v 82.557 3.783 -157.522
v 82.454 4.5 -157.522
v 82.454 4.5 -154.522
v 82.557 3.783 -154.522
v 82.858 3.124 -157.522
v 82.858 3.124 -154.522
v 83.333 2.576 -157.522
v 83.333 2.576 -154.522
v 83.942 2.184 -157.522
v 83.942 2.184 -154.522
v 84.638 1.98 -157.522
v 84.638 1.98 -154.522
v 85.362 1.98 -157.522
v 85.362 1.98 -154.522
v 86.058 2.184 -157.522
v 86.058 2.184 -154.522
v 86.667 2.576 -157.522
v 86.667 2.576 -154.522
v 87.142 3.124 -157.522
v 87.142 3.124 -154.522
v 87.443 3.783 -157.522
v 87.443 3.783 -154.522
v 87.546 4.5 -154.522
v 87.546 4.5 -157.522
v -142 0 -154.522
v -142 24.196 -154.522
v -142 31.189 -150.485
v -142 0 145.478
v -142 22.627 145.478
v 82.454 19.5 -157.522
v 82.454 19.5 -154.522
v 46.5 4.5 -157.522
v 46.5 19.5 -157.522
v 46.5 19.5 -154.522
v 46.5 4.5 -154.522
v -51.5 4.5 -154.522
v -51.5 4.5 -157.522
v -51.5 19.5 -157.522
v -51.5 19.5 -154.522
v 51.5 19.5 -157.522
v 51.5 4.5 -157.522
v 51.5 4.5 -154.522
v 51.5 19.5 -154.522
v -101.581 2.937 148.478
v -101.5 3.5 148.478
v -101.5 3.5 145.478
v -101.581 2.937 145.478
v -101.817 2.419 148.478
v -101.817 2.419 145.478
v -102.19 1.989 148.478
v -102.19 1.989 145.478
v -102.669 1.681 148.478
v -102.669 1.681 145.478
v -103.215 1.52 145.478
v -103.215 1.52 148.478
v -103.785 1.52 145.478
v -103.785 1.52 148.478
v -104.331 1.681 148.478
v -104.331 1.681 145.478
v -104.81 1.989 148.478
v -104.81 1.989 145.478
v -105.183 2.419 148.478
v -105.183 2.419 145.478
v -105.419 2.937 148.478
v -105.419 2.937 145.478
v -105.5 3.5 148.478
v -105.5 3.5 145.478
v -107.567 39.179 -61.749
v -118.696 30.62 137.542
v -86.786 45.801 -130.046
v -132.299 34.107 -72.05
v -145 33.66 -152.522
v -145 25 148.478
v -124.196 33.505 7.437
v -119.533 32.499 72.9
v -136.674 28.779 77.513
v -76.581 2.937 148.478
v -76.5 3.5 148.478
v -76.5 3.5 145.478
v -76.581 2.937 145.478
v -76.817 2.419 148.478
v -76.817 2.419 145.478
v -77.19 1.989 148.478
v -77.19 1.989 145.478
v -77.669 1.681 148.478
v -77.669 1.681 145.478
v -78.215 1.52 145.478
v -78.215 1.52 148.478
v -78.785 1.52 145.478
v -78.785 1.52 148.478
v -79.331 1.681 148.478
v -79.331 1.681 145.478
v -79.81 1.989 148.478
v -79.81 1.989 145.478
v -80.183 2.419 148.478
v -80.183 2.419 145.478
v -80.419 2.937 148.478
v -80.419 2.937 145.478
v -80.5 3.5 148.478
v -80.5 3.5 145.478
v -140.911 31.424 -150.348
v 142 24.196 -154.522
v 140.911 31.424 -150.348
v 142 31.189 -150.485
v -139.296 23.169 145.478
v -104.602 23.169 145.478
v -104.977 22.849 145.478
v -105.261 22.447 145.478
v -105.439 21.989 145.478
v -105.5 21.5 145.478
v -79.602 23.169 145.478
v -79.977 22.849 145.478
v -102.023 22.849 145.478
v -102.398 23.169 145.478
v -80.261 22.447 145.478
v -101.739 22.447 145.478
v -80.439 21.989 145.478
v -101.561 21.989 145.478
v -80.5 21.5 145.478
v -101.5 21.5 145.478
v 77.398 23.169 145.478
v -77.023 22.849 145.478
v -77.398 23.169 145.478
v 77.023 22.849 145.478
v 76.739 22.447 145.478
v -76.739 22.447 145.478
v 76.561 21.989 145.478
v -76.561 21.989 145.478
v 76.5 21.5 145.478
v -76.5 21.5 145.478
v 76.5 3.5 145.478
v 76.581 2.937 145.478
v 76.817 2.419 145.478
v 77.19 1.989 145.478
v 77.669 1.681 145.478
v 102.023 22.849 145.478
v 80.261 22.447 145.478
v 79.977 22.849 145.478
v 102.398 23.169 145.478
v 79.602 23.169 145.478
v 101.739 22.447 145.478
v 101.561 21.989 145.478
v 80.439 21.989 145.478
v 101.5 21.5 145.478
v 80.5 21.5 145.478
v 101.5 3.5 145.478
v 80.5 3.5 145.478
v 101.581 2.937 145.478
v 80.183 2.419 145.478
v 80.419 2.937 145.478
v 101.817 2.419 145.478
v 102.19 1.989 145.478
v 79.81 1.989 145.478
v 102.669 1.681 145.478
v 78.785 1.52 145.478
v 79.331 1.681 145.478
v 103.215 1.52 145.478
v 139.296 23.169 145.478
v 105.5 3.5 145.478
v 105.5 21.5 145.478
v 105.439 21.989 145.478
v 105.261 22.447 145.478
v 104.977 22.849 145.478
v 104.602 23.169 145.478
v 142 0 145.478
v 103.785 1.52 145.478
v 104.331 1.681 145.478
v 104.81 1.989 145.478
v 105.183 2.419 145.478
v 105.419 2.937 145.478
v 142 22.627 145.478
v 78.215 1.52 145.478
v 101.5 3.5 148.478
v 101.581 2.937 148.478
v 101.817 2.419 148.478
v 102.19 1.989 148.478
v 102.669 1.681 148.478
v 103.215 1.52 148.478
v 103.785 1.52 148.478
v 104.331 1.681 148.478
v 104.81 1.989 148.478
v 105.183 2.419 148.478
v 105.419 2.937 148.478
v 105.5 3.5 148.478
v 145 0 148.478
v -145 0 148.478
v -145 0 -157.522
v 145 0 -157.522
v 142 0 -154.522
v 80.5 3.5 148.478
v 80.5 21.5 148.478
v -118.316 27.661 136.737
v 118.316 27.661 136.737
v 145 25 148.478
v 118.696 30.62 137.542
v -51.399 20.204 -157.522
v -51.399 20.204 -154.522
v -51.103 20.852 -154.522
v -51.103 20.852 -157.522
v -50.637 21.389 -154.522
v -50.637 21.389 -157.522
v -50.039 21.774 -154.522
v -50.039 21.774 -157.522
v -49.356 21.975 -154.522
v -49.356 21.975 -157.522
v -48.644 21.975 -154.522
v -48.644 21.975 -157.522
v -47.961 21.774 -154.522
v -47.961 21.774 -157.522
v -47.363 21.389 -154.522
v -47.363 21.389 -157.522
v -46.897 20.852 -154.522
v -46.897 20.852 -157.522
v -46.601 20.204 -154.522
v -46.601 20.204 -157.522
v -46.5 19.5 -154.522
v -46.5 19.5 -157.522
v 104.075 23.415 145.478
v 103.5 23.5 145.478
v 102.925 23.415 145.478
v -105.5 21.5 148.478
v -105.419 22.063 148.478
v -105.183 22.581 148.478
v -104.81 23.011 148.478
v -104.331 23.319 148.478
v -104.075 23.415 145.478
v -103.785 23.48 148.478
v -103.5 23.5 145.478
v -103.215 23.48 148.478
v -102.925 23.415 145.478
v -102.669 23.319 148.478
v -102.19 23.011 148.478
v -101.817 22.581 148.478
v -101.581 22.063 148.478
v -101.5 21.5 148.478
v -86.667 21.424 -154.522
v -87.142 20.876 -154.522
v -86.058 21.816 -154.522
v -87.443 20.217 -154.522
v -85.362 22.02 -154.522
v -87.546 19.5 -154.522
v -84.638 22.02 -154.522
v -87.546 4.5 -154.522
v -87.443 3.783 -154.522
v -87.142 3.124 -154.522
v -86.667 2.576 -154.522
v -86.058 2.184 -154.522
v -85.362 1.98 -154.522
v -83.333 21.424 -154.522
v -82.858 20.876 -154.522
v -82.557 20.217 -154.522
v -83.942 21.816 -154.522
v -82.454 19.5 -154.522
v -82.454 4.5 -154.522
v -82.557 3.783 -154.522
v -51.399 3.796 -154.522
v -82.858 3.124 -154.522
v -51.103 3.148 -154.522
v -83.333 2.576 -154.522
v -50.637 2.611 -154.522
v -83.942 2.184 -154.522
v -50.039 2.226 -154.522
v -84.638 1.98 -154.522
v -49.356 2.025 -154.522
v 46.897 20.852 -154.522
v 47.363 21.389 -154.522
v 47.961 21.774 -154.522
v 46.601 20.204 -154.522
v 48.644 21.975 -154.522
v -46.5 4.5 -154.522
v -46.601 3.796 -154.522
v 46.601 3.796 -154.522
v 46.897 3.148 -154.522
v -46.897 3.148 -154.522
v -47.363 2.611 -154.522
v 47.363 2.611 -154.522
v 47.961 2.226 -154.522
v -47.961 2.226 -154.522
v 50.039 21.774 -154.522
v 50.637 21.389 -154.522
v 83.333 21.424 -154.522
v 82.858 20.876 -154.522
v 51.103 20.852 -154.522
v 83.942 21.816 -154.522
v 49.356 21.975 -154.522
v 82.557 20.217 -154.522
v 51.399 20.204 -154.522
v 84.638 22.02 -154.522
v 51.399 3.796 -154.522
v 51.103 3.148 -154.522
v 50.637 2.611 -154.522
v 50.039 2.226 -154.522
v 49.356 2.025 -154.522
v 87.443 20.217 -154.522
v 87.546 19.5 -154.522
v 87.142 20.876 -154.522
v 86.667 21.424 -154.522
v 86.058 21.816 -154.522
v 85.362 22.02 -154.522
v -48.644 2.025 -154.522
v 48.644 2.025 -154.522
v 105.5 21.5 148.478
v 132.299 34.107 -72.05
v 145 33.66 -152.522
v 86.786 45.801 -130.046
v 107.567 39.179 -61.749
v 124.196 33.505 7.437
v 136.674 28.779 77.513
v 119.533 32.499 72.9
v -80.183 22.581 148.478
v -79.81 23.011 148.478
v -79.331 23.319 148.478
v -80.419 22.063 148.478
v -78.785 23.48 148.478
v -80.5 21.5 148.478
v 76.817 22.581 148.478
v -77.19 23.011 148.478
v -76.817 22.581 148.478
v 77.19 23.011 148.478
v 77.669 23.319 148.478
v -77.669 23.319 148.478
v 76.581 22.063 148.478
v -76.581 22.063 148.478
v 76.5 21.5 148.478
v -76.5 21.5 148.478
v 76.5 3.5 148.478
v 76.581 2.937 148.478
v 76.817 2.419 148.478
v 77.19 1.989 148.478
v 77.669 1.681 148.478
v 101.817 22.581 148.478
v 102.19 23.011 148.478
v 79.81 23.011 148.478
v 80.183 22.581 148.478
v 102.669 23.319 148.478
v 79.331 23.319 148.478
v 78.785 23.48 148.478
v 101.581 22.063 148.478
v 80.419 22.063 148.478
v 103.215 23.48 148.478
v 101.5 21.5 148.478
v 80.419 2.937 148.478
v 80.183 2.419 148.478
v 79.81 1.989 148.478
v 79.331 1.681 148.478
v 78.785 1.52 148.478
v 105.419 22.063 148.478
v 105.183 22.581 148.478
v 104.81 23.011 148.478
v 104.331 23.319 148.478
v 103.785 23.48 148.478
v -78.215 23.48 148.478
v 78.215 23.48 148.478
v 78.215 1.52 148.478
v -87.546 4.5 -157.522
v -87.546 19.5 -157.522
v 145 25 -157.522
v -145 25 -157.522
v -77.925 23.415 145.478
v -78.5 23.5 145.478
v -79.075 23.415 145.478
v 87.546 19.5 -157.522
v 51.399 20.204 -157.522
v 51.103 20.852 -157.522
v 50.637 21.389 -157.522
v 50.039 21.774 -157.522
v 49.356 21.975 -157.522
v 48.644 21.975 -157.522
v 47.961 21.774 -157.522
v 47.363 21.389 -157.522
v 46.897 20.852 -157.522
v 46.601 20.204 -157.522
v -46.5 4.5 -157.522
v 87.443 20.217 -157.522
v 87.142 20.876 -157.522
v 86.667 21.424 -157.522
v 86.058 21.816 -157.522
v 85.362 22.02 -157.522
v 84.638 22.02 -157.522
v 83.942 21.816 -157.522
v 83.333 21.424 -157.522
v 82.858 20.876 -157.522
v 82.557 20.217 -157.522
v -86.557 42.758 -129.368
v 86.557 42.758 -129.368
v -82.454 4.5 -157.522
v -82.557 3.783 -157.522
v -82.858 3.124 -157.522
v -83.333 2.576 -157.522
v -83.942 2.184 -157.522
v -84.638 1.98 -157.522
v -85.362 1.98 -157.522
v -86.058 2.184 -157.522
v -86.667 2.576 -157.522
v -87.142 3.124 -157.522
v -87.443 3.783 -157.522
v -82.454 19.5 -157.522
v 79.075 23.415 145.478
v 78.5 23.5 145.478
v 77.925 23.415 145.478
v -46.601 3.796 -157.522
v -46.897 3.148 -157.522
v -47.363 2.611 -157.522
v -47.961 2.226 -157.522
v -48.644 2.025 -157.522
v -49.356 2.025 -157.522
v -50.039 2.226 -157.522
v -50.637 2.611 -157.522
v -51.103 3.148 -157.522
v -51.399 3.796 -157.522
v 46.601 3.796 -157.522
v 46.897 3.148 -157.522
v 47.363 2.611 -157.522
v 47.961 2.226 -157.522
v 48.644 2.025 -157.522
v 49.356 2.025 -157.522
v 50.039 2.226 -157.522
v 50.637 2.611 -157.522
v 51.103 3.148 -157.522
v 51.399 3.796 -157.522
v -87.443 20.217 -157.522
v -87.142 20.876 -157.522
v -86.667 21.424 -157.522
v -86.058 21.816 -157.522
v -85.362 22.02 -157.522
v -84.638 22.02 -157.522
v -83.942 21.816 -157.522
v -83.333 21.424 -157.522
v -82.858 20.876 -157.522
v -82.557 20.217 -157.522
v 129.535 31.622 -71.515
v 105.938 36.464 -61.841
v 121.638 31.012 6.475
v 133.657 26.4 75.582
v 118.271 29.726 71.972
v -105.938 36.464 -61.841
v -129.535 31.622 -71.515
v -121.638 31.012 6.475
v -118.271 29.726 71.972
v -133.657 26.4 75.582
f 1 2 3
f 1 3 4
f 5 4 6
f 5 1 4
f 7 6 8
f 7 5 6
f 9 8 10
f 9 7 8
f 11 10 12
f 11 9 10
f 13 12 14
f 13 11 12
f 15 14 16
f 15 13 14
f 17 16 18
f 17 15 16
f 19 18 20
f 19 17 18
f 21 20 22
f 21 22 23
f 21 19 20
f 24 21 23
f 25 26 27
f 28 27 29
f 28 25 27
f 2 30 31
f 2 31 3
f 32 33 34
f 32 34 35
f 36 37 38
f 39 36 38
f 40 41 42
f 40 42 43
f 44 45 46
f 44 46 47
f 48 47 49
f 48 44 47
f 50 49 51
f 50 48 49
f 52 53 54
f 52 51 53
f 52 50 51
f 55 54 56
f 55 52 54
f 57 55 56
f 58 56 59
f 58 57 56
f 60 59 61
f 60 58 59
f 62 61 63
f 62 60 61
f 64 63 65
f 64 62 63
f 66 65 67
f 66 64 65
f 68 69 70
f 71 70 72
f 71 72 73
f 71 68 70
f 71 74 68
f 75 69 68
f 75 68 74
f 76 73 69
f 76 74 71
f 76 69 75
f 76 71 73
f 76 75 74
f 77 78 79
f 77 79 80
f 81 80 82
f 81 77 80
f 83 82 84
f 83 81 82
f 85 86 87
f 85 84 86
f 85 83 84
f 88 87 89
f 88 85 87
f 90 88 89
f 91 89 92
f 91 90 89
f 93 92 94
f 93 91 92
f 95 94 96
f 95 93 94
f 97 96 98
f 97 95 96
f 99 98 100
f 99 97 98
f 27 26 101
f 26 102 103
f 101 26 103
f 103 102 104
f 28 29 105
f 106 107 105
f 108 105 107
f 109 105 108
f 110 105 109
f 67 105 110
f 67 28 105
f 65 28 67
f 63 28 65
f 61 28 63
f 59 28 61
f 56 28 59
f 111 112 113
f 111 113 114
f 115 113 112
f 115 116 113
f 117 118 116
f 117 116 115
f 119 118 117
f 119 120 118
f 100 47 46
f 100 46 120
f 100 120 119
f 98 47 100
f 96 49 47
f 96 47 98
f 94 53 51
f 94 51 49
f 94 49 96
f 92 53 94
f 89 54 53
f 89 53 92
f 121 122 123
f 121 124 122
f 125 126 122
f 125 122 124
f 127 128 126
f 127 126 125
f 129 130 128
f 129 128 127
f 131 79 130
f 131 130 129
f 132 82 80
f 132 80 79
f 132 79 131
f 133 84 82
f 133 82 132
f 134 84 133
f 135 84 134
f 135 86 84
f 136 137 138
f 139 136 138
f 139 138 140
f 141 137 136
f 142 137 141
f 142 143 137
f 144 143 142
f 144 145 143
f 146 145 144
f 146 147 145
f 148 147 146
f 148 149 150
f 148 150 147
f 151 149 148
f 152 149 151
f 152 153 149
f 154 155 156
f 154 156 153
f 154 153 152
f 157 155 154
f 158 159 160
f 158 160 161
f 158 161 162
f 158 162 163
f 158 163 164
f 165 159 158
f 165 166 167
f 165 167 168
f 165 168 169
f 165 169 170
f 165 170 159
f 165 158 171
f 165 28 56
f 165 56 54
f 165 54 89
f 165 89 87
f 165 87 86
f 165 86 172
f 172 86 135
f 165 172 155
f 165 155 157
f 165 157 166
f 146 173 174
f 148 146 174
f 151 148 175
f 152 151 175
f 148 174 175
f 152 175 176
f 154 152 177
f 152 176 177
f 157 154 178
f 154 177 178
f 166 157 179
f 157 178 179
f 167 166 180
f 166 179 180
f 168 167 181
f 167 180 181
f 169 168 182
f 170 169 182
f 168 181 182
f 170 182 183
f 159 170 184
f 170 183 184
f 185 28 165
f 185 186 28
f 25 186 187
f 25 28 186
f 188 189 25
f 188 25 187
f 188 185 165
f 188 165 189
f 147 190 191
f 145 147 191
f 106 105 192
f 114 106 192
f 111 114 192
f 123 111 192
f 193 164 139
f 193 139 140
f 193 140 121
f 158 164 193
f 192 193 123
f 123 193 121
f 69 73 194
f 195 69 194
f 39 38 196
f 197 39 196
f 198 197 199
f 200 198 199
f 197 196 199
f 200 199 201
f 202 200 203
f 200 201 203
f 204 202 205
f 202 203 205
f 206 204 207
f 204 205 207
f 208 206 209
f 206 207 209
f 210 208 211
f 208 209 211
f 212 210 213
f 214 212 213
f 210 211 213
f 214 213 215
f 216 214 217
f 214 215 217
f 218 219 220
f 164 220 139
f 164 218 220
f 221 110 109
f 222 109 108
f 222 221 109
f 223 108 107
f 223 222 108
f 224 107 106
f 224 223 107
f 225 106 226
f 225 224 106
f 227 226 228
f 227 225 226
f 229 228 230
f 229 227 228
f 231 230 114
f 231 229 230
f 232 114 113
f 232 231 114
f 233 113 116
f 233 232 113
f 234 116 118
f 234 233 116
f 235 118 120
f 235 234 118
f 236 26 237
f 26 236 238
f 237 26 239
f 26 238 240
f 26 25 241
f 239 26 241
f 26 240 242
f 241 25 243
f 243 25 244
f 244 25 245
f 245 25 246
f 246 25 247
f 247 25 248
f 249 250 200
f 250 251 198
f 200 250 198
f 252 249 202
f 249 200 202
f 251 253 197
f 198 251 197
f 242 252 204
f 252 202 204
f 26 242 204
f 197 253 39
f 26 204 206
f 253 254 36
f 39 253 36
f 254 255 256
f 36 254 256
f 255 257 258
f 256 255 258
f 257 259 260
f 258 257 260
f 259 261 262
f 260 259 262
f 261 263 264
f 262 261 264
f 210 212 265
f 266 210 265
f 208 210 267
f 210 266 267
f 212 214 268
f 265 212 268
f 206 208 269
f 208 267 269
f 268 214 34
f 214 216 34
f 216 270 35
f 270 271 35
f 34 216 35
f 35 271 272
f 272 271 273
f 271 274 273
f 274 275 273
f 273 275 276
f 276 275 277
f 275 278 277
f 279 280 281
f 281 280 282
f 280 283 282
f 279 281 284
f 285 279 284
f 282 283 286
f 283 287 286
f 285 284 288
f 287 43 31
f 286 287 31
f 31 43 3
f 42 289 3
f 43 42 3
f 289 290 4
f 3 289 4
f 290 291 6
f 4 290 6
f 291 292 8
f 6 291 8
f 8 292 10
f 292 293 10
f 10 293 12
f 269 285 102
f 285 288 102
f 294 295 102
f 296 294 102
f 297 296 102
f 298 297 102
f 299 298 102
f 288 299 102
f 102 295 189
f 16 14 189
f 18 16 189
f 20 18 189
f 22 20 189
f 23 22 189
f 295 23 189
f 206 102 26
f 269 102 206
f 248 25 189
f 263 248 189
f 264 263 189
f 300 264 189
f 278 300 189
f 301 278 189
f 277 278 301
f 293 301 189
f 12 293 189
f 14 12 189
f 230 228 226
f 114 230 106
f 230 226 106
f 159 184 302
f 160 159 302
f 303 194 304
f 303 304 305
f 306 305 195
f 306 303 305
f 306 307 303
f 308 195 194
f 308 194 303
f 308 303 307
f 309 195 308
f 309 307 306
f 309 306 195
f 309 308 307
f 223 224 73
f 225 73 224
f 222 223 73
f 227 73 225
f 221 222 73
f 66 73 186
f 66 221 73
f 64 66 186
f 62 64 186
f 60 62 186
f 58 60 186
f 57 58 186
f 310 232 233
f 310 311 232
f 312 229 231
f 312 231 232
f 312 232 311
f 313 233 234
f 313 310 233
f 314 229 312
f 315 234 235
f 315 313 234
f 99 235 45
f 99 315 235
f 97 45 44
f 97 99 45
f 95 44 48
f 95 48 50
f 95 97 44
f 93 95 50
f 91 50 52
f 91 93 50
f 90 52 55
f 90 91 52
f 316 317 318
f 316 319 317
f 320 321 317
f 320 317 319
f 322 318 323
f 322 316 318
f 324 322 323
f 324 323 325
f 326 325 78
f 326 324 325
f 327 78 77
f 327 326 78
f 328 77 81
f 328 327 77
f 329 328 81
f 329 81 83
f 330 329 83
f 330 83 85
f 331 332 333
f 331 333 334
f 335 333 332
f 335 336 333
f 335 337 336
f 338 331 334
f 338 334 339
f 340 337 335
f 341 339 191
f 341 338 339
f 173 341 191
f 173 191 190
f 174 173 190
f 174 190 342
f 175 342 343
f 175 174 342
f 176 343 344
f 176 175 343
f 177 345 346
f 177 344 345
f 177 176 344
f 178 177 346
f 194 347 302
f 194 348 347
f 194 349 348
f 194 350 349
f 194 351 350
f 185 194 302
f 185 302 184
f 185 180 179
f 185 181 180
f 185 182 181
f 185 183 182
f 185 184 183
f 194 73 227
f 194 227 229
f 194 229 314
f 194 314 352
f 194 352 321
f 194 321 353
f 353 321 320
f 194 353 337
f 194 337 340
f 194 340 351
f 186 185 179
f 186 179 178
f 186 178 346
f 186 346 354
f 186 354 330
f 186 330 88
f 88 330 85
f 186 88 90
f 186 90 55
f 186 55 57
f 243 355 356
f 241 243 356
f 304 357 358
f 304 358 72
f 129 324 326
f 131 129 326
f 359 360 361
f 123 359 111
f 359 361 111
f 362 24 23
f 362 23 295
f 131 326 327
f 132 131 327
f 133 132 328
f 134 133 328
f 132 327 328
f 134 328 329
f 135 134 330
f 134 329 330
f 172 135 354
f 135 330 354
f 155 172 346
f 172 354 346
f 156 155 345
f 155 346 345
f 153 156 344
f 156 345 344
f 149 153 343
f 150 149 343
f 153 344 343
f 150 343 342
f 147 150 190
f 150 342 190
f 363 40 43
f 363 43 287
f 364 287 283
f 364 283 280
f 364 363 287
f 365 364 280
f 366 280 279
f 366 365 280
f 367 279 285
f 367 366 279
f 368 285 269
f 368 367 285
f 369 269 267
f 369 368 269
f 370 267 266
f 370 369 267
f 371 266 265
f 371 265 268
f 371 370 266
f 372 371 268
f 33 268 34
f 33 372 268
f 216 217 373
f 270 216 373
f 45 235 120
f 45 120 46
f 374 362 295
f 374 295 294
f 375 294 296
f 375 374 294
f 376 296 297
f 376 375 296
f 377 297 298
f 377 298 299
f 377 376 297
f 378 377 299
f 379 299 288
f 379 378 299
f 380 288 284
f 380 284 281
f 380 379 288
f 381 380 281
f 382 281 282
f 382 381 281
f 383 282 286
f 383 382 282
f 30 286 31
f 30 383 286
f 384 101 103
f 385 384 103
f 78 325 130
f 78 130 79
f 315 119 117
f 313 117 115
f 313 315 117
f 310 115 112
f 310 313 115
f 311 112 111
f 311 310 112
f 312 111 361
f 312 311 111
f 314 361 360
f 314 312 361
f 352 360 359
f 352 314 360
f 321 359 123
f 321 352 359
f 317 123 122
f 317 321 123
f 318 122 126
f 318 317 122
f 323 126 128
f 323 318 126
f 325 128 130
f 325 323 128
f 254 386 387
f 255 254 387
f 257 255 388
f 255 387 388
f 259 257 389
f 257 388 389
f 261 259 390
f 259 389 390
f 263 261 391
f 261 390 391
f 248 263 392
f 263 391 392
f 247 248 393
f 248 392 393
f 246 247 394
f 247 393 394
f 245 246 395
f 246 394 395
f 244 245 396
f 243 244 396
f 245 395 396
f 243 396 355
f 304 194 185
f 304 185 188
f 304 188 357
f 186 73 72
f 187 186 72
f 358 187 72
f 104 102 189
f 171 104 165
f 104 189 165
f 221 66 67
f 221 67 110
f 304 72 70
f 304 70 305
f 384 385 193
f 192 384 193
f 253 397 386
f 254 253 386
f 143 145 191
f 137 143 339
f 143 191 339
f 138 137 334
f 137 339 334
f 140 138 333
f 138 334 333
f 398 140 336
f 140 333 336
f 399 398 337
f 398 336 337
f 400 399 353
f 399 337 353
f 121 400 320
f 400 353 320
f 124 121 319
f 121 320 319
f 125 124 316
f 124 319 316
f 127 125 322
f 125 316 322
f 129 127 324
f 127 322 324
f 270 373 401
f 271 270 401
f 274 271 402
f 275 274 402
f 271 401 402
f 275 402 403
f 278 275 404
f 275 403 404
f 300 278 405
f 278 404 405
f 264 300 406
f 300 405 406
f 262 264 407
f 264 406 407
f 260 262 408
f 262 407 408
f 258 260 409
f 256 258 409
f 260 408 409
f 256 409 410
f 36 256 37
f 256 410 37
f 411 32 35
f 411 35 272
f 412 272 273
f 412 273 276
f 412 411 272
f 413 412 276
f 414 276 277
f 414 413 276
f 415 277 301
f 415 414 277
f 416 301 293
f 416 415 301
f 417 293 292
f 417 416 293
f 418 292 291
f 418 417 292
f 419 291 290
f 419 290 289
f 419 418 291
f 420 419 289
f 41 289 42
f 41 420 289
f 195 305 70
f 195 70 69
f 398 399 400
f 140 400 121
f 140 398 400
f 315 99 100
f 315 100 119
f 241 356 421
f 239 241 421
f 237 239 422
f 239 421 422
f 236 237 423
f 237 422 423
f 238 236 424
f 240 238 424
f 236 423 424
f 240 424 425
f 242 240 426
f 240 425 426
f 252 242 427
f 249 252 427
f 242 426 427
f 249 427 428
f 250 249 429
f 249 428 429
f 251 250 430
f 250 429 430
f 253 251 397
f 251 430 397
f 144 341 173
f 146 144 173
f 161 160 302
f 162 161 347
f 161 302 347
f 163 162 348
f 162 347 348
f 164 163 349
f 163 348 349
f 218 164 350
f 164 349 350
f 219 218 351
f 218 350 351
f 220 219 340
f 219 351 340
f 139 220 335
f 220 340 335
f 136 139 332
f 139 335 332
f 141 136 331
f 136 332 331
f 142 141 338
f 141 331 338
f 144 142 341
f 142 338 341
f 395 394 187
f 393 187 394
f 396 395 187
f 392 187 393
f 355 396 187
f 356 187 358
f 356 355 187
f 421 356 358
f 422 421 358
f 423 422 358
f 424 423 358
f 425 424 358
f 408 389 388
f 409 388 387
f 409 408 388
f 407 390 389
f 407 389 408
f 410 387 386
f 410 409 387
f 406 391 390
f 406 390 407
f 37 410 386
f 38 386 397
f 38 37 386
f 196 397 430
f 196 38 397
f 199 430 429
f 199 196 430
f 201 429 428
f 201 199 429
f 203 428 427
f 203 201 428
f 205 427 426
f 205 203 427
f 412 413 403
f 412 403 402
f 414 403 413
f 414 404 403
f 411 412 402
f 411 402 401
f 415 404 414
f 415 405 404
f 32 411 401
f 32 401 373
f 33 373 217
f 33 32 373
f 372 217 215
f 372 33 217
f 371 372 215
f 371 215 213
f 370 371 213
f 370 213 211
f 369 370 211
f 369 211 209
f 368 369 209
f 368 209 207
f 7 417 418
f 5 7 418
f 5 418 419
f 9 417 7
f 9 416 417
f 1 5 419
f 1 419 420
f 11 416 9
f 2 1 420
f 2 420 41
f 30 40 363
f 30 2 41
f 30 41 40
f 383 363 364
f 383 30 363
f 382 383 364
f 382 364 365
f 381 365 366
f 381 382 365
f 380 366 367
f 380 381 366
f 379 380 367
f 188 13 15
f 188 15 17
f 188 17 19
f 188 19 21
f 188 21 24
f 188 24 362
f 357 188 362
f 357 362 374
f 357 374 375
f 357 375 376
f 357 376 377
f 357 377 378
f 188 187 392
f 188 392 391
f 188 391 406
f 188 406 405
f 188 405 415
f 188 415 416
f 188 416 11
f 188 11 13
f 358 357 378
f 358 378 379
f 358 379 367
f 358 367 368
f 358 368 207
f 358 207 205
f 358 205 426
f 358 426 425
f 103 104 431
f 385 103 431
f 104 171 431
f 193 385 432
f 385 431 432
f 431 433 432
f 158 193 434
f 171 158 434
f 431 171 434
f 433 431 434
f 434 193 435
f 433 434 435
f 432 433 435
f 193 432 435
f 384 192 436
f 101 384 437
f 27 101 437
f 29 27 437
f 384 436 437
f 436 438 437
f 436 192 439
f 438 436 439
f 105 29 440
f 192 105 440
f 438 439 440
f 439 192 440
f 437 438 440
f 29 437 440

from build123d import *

# Parameters (mm, degrees)
EXTRUDE_1_DEPTH     = 145
CUT_EXTRUDE_1_DEPTH = 150
CUT_EXTRUDE_2_DEPTH = 150
SHELL_1_T           = 3
CUT_EXTRUDE_4_DEPTH = 3
SKETCH_13_W         = 284
SKETCH_13_H         = 300
CUT_EXTRUDE_5_DEPTH = 3
CUT_EXTRUDE_6_DEPTH = 3


with BuildPart() as part:
    # 草图4 → 凸台-拉伸1 (new, symmetric)
    with BuildSketch(Plane(origin=(0, 0, 0), x_dir=(0, 0, -1), z_dir=(1, 0, 0))):
        Polygon((-148.47826087, 0), (157.52173913, 0), (157.52173913, 25), (145.02173913, 46.650635095), (-148.47826087, 30), align=None)
    extrude(amount=EXTRUDE_1_DEPTH, both=True)

    # 草图5 → 切除-放样1 section 0
    with BuildSketch(Plane(origin=(0, 74.458913868, -128.966621895), x_dir=(-1, 0, 0), z_dir=(0, 0.500000000000004, -0.8660254037844364))):
        with BuildLine():
            Line((-145, -47.110234471), (-85, -32.110234471))
            Line((-85, -32.110234471), (-145, -32.110234471))
            Line((-145, -32.110234471), (-145, -47.110234471))
        make_face()
    # 草图6 → 切除-放样1 section 1
    with BuildSketch(Plane.XY.offset(148.47826087)):
        with BuildLine():
            Line((145, 30), (120, 30))
            Line((120, 30), (145, 25))
            Line((145, 25), (145, 30))
        make_face()
    loft(mode=Mode.SUBTRACT)

    # 草图7 → 切除-放样2 section 0
    with BuildSketch(Plane(origin=(0, 74.458913868, -128.966621895), x_dir=(-1, 0, 0), z_dir=(0, 0.500000000000004, -0.8660254037844364))):
        with BuildLine():
            Line((145, -32.110234471), (85, -32.110234471))
            Line((85, -32.110234471), (145, -47.110234471))
            Line((145, -47.110234471), (145, -32.110234471))
        make_face()
    # 草图8 → 切除-放样2 section 1
    with BuildSketch(Plane.XY.offset(148.47826087)):
        with BuildLine():
            Line((-120, 30), (-145, 30))
            Line((-145, 30), (-145, 25))
            Line((-145, 25), (-120, 30))
        make_face()
    loft(mode=Mode.SUBTRACT)

    # 草图9 → 切除-拉伸1 (cut, symmetric)
    with BuildSketch(Plane(origin=(0, 0, 0), x_dir=(0, 0, -1), z_dir=(1, 0, 0))):
        Polygon((-148.47826087, 25), (-137.542379964, 30.620406686), (-148.47826087, 30), align=None)
    extrude(amount=CUT_EXTRUDE_1_DEPTH, both=True, mode=Mode.SUBTRACT)

    # 草图10 → 切除-拉伸2 (cut, symmetric)
    with BuildSketch(Plane(origin=(0, 0, 0), x_dir=(0, 0, -1), z_dir=(1, 0, 0))):
        Polygon((152.52173913, 33.660254038), (130.045819319, 45.801031769), (145.02173913, 46.650635095), align=None)
    extrude(amount=CUT_EXTRUDE_2_DEPTH, both=True, mode=Mode.SUBTRACT)

    # 抽壳1 (no face opened: a closed hollow body)
    add(offset(amount=-SHELL_1_T, mode=Mode.PRIVATE), mode=Mode.SUBTRACT)

    # 草图12 → 切除-拉伸4 (cut)
    with BuildSketch(Plane.XY.offset(148.47826087)):
        with BuildLine():
            Line((-76.5, 21.5), (-76.5, 3.5))
            ThreePointArc((-76.5, 3.5), (-78.5, 1.5), (-80.5, 3.5))
            Line((-80.5, 3.5), (-80.5, 21.5))
            ThreePointArc((-80.5, 21.5), (-78.5, 23.5), (-76.5, 21.5))
        make_face()
        with BuildLine():
            Line((-101.5, 21.5), (-101.5, 3.5))
            ThreePointArc((-101.5, 3.5), (-103.5, 1.5), (-105.5, 3.5))
            Line((-105.5, 3.5), (-105.5, 21.5))
            ThreePointArc((-105.5, 21.5), (-103.5, 23.5), (-101.5, 21.5))
        make_face()
        with BuildLine():
            Line((76.5, 21.5), (76.5, 3.5))
            ThreePointArc((76.5, 3.5), (78.5, 1.5), (80.5, 3.5))
            Line((80.5, 3.5), (80.5, 21.5))
            ThreePointArc((80.5, 21.5), (78.5, 23.5), (76.5, 21.5))
        make_face()
        with BuildLine():
            Line((101.5, 21.5), (101.5, 3.5))
            ThreePointArc((101.5, 3.5), (103.5, 1.5), (105.5, 3.5))
            Line((105.5, 3.5), (105.5, 21.5))
            ThreePointArc((105.5, 21.5), (103.5, 23.5), (101.5, 21.5))
        make_face()
    extrude(amount=-CUT_EXTRUDE_4_DEPTH, mode=Mode.SUBTRACT)

    # 草图13 → 切除-拉伸5 (cut)
    with BuildSketch(Plane.XZ):
        with Locations((0, -4.52173913)):
            Rectangle(SKETCH_13_W, SKETCH_13_H)
    extrude(amount=-CUT_EXTRUDE_5_DEPTH, mode=Mode.SUBTRACT)

    # 草图14 → 切除-拉伸6 (cut)
    with BuildSketch(Plane(origin=(0, 0, -157.52173913), x_dir=(-1, 0, 0), z_dir=(0, 0, -1))):
        with BuildLine():
            Line((-46.5, 19.5), (-46.5, 4.5))
            ThreePointArc((-46.5, 4.5), (-49, 2), (-51.5, 4.5))
            Line((-51.5, 4.5), (-51.5, 19.5))
            ThreePointArc((-51.5, 19.5), (-49, 22), (-46.5, 19.5))
        make_face()
        with BuildLine():
            Line((-82.454286499, 19.5), (-82.454286499, 4.5))
            ThreePointArc((-82.454286499, 4.5), (-85, 1.954286499), (-87.545713501, 4.5))
            Line((-87.545713501, 4.5), (-87.545713501, 19.5))
            ThreePointArc((-87.545713501, 19.5), (-85, 22.045713501), (-82.454286499, 19.5))
        make_face()
        with BuildLine():
            Line((46.5, 19.5), (46.5, 4.5))
            ThreePointArc((46.5, 4.5), (49, 2), (51.5, 4.5))
            Line((51.5, 4.5), (51.5, 19.5))
            ThreePointArc((51.5, 19.5), (49, 22), (46.5, 19.5))
        make_face()
        with BuildLine():
            Line((82.454286499, 19.5), (82.454286499, 4.5))
            ThreePointArc((82.454286499, 4.5), (85, 1.954286499), (87.545713501, 4.5))
            Line((87.545713501, 4.5), (87.545713501, 19.5))
            ThreePointArc((87.545713501, 19.5), (85, 22.045713501), (82.454286499, 19.5))
        make_face()
    extrude(amount=-CUT_EXTRUDE_6_DEPTH, mode=Mode.SUBTRACT)


solid = part.part
